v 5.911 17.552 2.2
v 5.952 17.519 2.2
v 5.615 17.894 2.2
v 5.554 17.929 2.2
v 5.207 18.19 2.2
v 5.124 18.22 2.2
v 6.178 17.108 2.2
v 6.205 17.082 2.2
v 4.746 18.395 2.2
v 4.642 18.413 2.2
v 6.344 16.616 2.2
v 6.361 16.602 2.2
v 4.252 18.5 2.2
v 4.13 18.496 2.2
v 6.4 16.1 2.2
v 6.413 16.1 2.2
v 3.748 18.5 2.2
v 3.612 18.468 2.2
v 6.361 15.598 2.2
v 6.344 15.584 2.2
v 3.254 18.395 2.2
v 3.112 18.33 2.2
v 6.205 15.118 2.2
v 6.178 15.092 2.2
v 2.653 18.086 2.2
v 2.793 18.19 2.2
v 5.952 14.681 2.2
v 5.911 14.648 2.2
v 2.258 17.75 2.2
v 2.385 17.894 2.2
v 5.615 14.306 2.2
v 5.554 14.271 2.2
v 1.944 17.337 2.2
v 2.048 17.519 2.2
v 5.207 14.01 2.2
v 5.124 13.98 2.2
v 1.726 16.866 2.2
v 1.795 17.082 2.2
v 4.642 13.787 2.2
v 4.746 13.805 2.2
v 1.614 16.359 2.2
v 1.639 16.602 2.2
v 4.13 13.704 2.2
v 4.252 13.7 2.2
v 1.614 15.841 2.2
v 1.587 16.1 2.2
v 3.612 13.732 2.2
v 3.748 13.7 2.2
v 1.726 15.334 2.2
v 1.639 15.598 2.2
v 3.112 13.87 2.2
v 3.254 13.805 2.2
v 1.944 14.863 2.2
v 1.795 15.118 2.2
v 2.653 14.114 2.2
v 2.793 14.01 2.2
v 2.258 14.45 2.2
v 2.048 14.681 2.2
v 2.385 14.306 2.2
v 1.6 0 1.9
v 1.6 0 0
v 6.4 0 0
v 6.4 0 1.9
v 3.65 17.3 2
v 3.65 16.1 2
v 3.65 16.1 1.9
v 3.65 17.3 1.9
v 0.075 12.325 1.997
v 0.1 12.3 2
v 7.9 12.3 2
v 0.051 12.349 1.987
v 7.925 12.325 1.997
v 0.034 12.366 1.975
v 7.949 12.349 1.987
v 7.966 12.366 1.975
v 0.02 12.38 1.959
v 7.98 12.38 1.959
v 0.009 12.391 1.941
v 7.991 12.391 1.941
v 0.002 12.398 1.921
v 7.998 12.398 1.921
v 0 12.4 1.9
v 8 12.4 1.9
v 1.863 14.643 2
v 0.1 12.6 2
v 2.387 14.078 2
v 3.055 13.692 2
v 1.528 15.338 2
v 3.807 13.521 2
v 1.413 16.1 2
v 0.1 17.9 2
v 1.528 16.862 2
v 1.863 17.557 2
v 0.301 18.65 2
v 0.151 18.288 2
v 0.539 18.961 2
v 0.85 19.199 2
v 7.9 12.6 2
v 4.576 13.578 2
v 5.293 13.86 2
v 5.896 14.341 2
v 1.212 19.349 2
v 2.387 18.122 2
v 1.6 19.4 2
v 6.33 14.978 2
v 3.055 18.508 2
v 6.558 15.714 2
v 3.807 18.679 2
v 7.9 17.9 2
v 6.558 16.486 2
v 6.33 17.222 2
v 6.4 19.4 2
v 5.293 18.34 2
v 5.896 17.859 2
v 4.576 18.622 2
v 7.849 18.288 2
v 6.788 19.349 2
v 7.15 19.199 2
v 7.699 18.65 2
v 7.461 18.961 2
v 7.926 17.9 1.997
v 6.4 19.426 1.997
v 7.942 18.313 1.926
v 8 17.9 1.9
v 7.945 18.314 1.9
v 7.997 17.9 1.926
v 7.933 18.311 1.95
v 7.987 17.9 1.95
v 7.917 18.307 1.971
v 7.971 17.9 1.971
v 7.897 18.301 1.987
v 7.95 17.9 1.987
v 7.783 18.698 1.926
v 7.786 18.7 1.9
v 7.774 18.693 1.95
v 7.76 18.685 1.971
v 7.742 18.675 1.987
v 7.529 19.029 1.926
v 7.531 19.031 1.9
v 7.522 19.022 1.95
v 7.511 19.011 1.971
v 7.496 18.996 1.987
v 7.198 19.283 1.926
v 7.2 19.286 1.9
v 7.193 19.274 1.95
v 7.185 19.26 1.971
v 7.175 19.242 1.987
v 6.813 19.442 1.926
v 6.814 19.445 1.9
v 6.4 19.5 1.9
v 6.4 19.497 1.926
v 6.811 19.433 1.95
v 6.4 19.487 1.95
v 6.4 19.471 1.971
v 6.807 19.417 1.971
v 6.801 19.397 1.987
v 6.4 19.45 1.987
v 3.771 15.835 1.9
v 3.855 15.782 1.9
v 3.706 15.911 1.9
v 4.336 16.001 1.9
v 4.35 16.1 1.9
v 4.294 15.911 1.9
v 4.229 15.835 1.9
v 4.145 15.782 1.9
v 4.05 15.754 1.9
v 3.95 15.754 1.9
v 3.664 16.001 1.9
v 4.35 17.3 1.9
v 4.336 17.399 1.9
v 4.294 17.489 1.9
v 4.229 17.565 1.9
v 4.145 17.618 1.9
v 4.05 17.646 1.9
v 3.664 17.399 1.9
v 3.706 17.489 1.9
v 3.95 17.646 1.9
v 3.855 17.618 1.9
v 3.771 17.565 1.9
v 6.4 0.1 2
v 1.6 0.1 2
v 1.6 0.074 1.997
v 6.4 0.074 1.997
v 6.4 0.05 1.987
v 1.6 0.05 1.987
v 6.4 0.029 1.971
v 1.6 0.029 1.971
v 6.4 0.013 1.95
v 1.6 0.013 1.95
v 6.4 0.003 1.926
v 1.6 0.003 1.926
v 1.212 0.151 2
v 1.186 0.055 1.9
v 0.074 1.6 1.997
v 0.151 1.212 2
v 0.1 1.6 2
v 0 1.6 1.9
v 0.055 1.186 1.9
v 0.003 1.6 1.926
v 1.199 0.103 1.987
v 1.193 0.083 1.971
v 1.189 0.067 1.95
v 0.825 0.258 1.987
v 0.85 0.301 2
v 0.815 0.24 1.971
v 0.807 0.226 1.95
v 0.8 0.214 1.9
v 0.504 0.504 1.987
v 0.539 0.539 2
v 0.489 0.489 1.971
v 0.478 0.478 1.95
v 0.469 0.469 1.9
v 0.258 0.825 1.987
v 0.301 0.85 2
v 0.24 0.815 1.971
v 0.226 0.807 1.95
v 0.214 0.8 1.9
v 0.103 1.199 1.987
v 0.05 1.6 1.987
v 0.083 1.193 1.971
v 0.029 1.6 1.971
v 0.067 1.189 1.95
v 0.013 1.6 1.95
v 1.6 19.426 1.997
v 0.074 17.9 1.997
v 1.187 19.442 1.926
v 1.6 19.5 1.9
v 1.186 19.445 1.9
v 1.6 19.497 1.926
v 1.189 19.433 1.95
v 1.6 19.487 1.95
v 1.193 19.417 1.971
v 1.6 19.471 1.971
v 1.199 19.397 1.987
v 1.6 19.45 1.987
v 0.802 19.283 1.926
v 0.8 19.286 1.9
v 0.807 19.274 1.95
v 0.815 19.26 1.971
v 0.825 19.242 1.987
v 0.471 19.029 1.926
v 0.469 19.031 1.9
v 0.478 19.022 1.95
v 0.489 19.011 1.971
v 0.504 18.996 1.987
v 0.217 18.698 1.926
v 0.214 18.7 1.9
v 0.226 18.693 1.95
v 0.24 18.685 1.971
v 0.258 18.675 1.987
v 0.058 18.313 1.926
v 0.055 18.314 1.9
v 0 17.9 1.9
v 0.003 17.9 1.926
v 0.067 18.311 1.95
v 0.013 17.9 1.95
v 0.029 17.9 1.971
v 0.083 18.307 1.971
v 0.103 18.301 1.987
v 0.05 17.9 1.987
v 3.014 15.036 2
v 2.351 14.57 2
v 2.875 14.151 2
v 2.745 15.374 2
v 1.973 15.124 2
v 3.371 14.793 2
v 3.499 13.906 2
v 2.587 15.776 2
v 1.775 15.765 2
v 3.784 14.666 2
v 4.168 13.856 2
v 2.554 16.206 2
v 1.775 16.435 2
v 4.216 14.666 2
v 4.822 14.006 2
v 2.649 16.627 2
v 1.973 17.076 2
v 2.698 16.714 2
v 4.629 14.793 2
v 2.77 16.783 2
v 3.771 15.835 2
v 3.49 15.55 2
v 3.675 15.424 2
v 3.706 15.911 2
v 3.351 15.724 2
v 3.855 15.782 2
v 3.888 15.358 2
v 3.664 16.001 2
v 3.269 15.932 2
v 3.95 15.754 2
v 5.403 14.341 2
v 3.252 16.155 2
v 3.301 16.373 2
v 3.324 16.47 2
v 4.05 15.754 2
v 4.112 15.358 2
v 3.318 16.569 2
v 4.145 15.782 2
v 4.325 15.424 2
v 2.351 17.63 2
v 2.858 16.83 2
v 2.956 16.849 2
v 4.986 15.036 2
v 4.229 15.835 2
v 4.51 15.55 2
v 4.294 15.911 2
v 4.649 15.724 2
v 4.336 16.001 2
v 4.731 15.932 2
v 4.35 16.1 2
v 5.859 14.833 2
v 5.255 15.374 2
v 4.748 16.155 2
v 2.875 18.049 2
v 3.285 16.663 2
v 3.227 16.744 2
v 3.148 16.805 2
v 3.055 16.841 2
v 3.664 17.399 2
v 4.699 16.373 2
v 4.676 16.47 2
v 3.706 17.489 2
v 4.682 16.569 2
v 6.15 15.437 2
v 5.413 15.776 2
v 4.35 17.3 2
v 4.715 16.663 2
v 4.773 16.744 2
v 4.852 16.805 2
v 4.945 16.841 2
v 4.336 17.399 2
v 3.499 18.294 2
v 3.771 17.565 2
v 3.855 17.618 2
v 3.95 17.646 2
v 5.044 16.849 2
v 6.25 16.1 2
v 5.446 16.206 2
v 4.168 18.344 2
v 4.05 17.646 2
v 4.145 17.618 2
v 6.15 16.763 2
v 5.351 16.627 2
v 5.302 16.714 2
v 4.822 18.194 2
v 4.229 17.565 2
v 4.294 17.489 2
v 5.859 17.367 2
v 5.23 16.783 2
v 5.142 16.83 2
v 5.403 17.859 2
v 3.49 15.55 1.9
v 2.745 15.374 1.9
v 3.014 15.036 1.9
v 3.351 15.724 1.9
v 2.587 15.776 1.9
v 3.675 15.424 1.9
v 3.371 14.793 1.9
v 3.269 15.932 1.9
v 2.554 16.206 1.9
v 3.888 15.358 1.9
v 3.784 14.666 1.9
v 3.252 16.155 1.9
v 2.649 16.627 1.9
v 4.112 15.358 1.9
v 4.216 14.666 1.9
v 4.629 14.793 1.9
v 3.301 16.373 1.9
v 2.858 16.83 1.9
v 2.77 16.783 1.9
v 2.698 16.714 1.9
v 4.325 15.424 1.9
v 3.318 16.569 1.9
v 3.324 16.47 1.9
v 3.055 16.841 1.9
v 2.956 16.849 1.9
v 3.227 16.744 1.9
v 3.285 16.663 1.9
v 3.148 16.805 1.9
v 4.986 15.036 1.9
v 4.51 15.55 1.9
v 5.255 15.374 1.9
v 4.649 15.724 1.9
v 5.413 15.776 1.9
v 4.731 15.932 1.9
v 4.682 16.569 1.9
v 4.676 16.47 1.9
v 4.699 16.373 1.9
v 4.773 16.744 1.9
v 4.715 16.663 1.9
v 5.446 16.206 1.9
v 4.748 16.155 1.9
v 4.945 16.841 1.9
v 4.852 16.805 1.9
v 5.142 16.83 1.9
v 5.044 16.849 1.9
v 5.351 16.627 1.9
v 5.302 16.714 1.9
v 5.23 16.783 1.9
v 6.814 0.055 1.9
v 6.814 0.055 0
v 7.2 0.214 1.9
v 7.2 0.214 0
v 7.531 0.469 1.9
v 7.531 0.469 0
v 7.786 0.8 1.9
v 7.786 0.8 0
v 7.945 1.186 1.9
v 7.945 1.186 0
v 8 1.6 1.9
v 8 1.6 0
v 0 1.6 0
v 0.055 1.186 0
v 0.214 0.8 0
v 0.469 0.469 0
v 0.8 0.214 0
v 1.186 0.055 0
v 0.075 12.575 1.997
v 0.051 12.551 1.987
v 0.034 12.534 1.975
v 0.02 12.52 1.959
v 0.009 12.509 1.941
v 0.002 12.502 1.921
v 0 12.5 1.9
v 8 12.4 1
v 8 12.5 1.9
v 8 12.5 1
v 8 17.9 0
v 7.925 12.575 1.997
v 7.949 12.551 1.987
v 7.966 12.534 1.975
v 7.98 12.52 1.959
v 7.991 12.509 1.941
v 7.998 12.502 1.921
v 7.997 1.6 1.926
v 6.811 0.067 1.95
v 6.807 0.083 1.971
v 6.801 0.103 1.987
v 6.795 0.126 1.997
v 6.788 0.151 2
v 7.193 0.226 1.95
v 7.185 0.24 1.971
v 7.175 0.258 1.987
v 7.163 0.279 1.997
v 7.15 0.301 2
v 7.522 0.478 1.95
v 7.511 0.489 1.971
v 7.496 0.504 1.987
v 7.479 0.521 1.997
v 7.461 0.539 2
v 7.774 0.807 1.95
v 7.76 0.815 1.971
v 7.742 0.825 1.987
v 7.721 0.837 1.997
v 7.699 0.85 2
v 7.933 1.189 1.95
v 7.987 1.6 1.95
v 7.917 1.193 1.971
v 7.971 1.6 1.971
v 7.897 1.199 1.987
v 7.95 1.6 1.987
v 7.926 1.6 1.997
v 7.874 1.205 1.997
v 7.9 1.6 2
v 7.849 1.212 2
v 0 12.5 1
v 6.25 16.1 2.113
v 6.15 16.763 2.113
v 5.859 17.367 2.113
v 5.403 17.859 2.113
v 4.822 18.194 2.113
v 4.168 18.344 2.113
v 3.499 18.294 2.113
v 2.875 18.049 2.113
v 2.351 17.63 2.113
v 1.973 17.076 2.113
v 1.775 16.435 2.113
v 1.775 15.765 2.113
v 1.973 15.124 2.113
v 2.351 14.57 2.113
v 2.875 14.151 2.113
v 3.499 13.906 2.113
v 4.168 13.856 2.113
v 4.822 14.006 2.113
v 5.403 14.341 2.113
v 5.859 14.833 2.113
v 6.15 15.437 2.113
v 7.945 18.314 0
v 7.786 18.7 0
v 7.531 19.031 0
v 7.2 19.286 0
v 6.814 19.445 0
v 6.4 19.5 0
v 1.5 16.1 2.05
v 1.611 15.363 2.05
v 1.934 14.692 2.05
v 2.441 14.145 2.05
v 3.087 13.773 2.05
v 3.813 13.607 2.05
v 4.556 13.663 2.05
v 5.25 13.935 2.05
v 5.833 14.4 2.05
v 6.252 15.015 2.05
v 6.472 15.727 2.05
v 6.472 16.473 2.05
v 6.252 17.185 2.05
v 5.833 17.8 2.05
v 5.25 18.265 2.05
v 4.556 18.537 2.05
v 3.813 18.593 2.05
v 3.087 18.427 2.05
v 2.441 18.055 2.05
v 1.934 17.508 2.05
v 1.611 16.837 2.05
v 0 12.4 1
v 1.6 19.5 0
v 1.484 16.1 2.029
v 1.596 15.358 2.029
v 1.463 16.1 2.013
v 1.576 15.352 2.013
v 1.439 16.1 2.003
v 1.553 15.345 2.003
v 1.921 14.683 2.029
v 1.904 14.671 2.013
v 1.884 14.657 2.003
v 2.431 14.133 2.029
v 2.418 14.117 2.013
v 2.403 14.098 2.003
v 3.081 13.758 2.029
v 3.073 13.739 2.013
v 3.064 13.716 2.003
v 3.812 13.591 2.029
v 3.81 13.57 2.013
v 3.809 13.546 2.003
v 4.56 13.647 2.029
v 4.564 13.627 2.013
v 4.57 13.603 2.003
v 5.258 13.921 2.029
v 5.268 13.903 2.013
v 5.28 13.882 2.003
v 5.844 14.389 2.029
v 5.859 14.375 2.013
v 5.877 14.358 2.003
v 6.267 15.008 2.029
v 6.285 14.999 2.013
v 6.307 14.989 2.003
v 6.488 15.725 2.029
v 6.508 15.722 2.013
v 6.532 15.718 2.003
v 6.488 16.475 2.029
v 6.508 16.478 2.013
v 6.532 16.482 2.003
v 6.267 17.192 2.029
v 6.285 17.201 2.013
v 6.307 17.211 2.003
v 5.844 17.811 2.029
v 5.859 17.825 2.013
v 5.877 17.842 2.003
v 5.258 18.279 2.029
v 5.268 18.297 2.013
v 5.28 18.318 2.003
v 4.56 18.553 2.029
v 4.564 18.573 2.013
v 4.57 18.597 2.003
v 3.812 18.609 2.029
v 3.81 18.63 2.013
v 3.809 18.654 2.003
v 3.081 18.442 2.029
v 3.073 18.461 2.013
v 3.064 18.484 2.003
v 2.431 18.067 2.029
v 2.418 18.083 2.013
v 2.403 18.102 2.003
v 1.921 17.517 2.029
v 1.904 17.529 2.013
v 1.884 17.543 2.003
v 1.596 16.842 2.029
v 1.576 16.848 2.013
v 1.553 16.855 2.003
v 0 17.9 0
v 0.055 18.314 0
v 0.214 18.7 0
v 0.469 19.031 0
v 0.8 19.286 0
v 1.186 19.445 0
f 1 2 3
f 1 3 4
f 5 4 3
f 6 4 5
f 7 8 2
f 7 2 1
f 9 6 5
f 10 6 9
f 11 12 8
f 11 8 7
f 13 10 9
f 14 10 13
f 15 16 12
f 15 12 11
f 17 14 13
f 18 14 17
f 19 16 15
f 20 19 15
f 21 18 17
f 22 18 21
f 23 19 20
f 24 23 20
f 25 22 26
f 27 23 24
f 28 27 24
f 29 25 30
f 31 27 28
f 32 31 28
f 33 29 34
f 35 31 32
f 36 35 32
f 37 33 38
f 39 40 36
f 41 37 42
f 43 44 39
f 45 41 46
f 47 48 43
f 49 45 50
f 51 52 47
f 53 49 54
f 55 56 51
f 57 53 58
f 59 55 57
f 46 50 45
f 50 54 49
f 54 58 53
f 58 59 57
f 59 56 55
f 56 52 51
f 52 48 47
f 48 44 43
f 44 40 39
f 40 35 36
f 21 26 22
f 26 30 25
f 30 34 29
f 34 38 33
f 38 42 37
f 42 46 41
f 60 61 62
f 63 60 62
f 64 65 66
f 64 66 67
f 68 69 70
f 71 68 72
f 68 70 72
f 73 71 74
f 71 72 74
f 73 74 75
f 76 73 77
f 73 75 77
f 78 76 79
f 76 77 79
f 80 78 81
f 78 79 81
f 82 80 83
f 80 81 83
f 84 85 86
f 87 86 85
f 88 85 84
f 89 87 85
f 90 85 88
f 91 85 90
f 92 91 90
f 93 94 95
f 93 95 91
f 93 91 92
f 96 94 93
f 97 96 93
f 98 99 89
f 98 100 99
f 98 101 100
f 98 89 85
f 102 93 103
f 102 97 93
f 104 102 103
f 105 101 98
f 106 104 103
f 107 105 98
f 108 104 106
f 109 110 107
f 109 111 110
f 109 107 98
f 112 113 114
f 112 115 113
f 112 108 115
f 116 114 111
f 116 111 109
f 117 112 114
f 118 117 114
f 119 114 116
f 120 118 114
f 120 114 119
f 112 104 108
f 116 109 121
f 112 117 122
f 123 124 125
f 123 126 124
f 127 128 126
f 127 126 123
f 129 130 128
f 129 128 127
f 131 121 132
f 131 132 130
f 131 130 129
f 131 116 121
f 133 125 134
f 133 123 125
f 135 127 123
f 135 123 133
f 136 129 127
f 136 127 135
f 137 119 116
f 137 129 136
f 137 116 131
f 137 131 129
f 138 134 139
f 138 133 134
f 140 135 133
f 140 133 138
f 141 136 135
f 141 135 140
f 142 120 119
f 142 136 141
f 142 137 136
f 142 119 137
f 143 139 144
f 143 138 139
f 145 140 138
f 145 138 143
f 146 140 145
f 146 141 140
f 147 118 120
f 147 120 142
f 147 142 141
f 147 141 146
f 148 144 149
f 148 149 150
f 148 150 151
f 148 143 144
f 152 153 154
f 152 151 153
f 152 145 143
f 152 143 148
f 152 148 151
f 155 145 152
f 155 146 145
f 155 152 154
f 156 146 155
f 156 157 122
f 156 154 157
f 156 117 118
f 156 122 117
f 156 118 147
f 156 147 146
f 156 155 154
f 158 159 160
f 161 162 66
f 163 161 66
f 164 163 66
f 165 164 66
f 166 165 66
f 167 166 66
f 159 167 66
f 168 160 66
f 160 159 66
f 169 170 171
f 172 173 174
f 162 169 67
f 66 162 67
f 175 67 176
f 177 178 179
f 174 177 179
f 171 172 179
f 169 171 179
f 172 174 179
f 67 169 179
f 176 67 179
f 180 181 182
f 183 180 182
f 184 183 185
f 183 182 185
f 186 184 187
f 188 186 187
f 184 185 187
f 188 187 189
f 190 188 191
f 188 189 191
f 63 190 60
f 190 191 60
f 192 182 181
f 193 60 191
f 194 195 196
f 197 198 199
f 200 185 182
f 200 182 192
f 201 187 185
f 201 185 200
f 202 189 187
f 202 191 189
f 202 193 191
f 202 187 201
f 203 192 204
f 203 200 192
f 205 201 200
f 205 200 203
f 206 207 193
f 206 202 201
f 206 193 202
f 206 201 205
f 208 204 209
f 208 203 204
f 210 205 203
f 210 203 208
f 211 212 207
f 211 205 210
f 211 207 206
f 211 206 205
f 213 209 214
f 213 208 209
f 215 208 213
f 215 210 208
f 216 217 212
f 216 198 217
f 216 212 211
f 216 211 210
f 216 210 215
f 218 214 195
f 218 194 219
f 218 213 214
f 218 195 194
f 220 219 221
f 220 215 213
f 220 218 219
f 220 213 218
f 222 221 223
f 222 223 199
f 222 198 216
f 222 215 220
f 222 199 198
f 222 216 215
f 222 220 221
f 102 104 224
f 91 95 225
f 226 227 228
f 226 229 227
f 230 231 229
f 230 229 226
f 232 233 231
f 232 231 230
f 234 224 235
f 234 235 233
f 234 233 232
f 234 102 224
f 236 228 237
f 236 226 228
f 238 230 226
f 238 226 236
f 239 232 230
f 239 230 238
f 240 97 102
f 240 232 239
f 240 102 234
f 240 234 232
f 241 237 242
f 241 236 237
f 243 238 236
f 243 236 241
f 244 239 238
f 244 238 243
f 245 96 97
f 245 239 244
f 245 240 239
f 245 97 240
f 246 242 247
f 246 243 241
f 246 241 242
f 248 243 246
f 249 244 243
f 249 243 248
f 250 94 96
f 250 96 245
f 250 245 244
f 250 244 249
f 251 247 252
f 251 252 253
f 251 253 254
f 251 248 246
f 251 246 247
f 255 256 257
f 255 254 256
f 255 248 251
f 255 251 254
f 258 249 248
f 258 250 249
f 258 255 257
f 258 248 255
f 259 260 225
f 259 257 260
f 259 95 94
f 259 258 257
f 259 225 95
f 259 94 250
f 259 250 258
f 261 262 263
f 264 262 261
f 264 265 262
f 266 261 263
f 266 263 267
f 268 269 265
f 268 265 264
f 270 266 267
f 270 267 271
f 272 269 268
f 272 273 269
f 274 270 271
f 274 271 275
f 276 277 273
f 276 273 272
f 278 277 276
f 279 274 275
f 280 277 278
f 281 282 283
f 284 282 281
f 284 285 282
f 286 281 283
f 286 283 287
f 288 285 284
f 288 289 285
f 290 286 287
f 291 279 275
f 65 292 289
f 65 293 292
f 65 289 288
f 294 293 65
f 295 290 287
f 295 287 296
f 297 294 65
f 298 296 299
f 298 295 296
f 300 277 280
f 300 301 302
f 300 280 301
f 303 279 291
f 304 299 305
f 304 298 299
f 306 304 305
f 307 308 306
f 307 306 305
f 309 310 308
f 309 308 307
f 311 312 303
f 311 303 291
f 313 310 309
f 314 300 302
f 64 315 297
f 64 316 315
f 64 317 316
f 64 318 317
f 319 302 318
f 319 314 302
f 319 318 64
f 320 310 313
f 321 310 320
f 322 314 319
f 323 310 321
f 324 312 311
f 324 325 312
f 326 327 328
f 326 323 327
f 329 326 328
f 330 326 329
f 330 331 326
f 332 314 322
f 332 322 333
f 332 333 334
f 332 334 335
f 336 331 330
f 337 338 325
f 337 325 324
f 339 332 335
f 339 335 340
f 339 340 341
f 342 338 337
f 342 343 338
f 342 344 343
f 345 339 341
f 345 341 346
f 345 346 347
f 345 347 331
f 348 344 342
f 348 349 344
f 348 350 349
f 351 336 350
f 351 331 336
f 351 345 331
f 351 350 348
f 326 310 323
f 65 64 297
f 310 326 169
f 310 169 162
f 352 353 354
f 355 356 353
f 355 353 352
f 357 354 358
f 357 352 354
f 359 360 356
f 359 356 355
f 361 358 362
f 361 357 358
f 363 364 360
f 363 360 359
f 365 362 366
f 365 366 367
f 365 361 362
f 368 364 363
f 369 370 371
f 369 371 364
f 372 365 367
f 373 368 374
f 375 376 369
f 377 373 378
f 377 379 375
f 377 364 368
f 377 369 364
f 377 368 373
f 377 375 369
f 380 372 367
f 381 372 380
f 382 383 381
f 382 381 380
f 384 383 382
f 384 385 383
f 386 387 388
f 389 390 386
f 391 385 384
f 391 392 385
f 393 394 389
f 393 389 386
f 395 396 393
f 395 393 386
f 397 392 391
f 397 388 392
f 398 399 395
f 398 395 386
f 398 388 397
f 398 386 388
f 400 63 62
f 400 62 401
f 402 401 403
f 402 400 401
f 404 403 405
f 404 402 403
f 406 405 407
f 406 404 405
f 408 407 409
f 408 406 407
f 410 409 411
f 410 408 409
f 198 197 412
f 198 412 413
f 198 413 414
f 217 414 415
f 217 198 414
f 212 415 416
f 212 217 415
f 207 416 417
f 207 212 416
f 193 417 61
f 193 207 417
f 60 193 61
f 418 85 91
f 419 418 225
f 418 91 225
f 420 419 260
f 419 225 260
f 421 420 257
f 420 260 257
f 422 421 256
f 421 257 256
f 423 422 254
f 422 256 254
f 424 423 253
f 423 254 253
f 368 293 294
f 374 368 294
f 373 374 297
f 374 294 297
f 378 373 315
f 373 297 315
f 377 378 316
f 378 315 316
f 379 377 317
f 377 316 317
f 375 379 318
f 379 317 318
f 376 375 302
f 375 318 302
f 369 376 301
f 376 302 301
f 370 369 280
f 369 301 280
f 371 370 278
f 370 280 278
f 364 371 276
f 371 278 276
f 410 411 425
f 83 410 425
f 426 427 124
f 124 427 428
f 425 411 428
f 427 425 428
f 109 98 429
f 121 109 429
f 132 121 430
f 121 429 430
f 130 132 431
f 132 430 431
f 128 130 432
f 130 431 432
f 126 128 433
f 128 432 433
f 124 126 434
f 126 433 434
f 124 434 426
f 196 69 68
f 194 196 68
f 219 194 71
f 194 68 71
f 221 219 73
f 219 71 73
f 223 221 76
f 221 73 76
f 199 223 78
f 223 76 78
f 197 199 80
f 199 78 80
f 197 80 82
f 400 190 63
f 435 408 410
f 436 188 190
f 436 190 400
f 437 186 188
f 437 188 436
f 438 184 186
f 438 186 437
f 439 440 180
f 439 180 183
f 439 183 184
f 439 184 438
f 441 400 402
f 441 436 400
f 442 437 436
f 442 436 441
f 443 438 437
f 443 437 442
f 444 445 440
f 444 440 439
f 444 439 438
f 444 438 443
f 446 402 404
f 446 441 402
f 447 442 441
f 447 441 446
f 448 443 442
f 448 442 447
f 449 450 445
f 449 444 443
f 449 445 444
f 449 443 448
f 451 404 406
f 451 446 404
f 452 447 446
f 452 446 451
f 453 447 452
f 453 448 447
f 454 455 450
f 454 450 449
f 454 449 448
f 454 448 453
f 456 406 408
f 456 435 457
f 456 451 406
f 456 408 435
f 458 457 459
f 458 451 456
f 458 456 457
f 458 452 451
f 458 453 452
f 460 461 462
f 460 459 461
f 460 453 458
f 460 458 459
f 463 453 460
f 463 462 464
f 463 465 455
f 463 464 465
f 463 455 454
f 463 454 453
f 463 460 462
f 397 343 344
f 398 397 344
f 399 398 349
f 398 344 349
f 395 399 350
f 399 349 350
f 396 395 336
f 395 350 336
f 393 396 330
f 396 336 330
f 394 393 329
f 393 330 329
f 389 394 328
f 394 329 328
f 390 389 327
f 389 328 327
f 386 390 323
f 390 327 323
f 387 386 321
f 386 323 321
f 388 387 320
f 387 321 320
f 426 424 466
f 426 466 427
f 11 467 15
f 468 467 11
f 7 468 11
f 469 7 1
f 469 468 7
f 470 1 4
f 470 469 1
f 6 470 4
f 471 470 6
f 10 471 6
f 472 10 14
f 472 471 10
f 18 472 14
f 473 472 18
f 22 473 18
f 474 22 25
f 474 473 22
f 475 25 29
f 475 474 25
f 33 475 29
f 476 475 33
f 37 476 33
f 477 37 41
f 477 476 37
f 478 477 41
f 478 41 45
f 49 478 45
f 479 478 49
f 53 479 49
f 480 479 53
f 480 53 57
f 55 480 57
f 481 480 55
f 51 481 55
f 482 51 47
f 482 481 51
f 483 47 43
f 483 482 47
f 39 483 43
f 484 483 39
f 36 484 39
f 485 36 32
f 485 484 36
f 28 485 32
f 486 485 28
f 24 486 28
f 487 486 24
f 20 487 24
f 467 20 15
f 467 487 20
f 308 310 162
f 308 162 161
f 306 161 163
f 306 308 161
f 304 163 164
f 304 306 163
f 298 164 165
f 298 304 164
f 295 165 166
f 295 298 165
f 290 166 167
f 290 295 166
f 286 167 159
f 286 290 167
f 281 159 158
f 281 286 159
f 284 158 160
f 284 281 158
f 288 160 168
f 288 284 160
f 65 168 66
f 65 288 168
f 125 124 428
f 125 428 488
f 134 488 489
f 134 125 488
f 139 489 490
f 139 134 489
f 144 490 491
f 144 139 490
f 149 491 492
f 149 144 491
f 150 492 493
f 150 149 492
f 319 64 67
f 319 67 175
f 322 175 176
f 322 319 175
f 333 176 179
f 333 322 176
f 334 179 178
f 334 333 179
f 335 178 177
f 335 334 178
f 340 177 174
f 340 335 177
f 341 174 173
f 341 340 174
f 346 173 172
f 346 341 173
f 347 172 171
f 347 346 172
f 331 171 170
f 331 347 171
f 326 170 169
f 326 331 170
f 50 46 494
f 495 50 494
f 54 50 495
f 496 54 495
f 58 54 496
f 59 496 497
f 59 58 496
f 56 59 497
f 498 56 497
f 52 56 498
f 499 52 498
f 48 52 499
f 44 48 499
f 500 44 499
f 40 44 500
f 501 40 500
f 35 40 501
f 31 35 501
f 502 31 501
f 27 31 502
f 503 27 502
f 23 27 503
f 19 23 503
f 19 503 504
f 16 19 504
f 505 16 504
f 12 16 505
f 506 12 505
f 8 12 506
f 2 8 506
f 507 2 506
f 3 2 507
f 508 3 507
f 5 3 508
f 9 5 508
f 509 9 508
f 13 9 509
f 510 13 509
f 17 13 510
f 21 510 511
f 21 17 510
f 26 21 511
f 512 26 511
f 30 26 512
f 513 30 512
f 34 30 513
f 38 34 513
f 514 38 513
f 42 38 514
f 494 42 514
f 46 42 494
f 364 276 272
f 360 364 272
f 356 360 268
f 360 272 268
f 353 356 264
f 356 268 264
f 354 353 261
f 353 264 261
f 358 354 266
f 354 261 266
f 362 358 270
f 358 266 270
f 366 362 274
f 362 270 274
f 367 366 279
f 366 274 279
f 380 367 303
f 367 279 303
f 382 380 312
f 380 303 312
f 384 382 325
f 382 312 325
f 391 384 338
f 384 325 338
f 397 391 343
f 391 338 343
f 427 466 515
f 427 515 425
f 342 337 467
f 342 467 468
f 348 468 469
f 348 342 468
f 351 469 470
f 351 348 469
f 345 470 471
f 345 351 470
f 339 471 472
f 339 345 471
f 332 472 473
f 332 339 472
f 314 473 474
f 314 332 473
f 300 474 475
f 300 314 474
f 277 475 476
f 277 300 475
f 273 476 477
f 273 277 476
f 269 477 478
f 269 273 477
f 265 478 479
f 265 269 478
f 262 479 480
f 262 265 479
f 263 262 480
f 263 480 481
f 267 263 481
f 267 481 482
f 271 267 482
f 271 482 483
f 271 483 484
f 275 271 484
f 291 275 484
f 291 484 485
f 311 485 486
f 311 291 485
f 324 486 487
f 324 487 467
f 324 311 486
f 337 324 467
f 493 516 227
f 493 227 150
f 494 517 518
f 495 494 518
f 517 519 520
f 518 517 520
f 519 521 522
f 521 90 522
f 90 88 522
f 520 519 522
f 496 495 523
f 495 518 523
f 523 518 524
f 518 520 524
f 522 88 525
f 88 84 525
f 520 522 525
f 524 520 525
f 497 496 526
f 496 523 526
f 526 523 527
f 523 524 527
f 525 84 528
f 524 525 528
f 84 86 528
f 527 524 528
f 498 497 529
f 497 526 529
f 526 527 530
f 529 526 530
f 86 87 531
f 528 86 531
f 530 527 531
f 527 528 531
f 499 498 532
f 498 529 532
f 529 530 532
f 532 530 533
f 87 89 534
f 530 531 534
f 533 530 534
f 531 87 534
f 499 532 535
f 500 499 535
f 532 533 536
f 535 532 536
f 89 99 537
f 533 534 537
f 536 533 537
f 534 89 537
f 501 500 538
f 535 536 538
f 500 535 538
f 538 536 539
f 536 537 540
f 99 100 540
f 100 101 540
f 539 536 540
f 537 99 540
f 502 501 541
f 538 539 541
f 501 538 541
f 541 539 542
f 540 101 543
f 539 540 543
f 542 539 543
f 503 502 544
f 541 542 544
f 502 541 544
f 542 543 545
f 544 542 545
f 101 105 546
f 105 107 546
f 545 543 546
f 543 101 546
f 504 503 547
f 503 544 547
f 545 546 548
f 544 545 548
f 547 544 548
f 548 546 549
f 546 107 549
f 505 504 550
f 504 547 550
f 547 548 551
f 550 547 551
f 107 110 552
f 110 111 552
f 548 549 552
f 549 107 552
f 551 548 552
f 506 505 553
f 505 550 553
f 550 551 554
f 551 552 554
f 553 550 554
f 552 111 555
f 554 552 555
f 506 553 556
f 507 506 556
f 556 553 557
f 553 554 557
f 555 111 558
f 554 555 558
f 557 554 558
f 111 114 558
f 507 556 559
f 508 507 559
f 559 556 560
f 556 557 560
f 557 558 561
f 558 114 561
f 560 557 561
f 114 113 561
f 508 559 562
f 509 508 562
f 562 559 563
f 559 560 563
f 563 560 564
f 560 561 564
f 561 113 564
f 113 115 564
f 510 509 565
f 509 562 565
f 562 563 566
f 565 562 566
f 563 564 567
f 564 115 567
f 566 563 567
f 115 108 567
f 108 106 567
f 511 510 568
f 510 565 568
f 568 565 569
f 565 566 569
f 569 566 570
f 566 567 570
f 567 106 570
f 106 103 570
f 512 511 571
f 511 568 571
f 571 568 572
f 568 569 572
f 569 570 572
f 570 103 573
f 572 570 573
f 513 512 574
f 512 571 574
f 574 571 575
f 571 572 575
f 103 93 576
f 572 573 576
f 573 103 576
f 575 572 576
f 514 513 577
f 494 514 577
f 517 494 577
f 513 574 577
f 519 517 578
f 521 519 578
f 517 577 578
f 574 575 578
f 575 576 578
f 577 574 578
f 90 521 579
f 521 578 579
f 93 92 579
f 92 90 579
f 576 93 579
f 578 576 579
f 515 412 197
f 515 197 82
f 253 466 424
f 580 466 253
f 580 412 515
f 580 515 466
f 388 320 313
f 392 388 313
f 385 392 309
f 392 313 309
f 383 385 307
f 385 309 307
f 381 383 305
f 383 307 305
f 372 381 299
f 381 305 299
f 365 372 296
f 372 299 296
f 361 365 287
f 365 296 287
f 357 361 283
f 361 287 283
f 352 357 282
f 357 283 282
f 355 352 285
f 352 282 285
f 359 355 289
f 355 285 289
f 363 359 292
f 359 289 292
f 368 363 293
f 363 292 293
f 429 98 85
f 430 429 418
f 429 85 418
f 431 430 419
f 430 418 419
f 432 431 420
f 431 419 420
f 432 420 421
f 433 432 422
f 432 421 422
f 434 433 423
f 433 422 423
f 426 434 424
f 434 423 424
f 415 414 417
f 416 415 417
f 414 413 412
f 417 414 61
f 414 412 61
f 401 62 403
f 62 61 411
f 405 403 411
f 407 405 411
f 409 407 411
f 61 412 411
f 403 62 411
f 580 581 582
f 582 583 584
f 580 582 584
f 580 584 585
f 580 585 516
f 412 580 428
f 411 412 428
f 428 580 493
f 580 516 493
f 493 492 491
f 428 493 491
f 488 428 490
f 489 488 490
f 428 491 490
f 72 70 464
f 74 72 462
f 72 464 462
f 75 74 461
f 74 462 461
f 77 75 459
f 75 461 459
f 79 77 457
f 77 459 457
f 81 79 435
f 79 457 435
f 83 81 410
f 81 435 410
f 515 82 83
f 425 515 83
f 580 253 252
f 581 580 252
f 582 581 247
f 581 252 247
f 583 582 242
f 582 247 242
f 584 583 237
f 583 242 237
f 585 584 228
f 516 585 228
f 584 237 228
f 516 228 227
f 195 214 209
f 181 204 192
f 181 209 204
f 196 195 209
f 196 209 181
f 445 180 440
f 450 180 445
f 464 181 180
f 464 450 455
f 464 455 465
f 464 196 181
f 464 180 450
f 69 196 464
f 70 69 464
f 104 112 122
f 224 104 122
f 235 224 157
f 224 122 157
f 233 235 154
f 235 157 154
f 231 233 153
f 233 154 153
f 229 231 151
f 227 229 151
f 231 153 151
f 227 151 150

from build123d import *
from OCP.BRepFilletAPI import BRepFilletAPI_MakeChamfer

# Parameters (mm, degrees)
SKETCH1_W           = 8
SKETCH1_H           = 19.5
BOSS_EXTRUDE1_DEPTH = 2
FILLET1_R           = 1.6
CUT_EXTRUDE1_DEPTH  = 0.1
SKETCH4_R           = 2.5
SKETCH4_R_2         = 2.25
BOSS_EXTRUDE2_DEPTH = 0.2
CHAMFER1_SIZE       = 0.15
CHAMFER1_SIZE2      = 0.08660254
SKETCH5_W           = 8
SKETCH5_H           = 0.1
CUT_EXTRUDE2_DEPTH  = 1
FILLET2_R           = 0.1


with BuildPart() as part:
    # Sketch1 → Boss-Extrude1 (new body)
    with BuildSketch(Plane.XY):
        with Locations((4, 9.75)):
            Rectangle(SKETCH1_W, SKETCH1_H)
    extrude(amount=BOSS_EXTRUDE1_DEPTH)

    # Fillet1
    fillet1_edges = [part.edges().sort_by_distance(p)[0] for p in [
        (0, 19.5, 1),
        (8, 19.5, 1),
        (8, 0, 1),
        (0, 0, 1),
    ]]
    fillet(fillet1_edges, radius=FILLET1_R)

    # Sketch3 → Cut-Extrude1 (cut)
    with BuildSketch(Plane.XY.offset(2)):
        with BuildLine():
            Line((4.35, 17.3), (4.35, 16.1))
            ThreePointArc((4.35, 16.1), (4, 15.75), (3.65, 16.1))
            Line((3.65, 16.1), (3.65, 17.3))
            ThreePointArc((3.65, 17.3), (4, 17.65), (4.35, 17.3))
        make_face()
        with BuildLine():
            ThreePointArc((2.649265581, 16.627272727), (4, 14.65), (5.350734419, 16.627272727))
            ThreePointArc((5.350734419, 16.627272727), (4.897422349, 16.826039343), (4.698655734, 16.372727273))
            ThreePointArc((4.698655734, 16.372727273), (4, 15.35), (3.301344266, 16.372727273))
            ThreePointArc((3.301344266, 16.372727273), (3.102577651, 16.826039343), (2.649265581, 16.627272727))
        make_face()
    extrude(amount=-CUT_EXTRUDE1_DEPTH, mode=Mode.SUBTRACT)

    # Sketch4 → Boss-Extrude2 (add)
    with BuildSketch(Plane.XY.offset(2)):
        with Locations(Location((4, 16.1, 0), (0, 0, 180))):
            Circle(SKETCH4_R)
        with Locations((4, 16.1)):
            Circle(SKETCH4_R_2, mode=Mode.SUBTRACT)
    extrude(amount=BOSS_EXTRUDE2_DEPTH)

    # Chamfer1: one chamfer whose edges measure the first distance from different faces: ONE call of the kernel's chamfer builder (chamfer() names one face for all edges)
    chamfer1_edges_1 = [part.edges().sort_by_distance(p)[0] for p in [
        (6.5, 16.1, 2.2),
    ]]
    chamfer1_side_1 = [part.faces().sort_by_distance(p)[0] for p in [
        (6.5, 16.1, 2.1),
    ]]
    chamfer1_edges_2 = [part.edges().sort_by_distance(p)[0] for p in [
        (1.75, 16.1, 2.2),
    ]]
    chamfer1_side_2 = [part.faces().sort_by_distance(p)[0] for p in [
        (6.429289322, 16.1, 2.2),
    ]]
    chamfer1 = BRepFilletAPI_MakeChamfer(part.part.solid().wrapped)
    for e in chamfer1_edges_1:
        chamfer1.Add(CHAMFER1_SIZE, CHAMFER1_SIZE2, e.wrapped, chamfer1_side_1[0].wrapped)  # the first distance lies on this face
    for e in chamfer1_edges_2:
        chamfer1.Add(CHAMFER1_SIZE, CHAMFER1_SIZE2, e.wrapped, chamfer1_side_2[0].wrapped)  # the first distance lies on this face
    add(Compound.cast(chamfer1.Shape()), mode=Mode.REPLACE)

    # Sketch5 → Cut-Extrude2 (cut)
    with BuildSketch(Plane.XY.offset(2)):
        with Locations((4, 12.45)):
            Rectangle(SKETCH5_W, SKETCH5_H)
    extrude(amount=-CUT_EXTRUDE2_DEPTH, mode=Mode.SUBTRACT)

    # Fillet2
    # the kernel refuses this fillet: 0.1 mm, written as the material it adds along each edge
    with BuildSketch(Plane(origin=(4, 16.1, 2), x_dir=(-1, 0, 0), z_dir=(0, 1, 0))) as fillet2_piece_1:
        with BuildLine():
            CenterArc((2.58660254, 0.1), FILLET2_R, 210, 60)
            Line((2.58660254, 0), (2.5, 0))
            Line((2.5, 0), (2.5, 0.05))
        make_face()
    revolve(axis=Axis((4, 16.1, 2), (0, 0, 1)))
    # the kernel refuses this fillet: 0.1 mm, written as the material it takes off along each edge
    with BuildSketch(Plane(origin=(8, 1.6, 2), x_dir=(0, 0, -1), z_dir=(0, 1, 0)), Plane(origin=(0, 12.65, 2), x_dir=(0, 0, -1), z_dir=(0, -1, 0))) as fillet2_2_piece_1:
        with BuildLine():
            CenterArc((FILLET2_R, FILLET2_R), FILLET2_R, 180, 90)
            Line((0, FILLET2_R), (0, 0))
            Line((0, 0), (FILLET2_R, 0))
        make_face()
    extrude(amount=11.05, mode=Mode.SUBTRACT)
    with BuildSketch(Plane(origin=(1.6, 0, 2), x_dir=(0, 1, 0), z_dir=(1, 0, 0)), Plane(origin=(6.4, 19.5, 2), x_dir=(0, -1, 0), z_dir=(-1, 0, 0))) as fillet2_2_piece_2:
        with BuildLine():
            CenterArc((FILLET2_R, -FILLET2_R), FILLET2_R, 90, 90)
            Line((0, -FILLET2_R), (0, 0))
            Line((0, 0), (FILLET2_R, 0))
        make_face()
    extrude(amount=4.8, mode=Mode.SUBTRACT)
    with BuildSketch(Plane(origin=(0, 17.9, 2), x_dir=(1, 0, 0), z_dir=(0, -1, 0)), Plane(origin=(8, 12.25, 2), x_dir=(-1, 0, 0), z_dir=(0, 1, 0))) as fillet2_2_piece_3:
        with BuildLine():
            CenterArc((FILLET2_R, -FILLET2_R), FILLET2_R, 90, 90)
            Line((0, -FILLET2_R), (0, 0))
            Line((0, 0), (FILLET2_R, 0))
        make_face()
    extrude(amount=5.65, mode=Mode.SUBTRACT)
    with BuildSketch(Plane(origin=(1.6, 17.9, 2), x_dir=(0, 1, 0), z_dir=(1, 0, 0))) as fillet2_2_piece_4:
        with BuildLine():
            CenterArc((1.6 - FILLET2_R, -FILLET2_R), FILLET2_R, 0, 90)
            Line((1.6, -FILLET2_R), (1.6, 0))
            Line((1.6, 0), (1.6 - FILLET2_R, 0))
        make_face()
    revolve(axis=Axis((1.6, 17.9, 2), (0, 0, 1)), revolution_arc=90, mode=Mode.SUBTRACT)
    with BuildSketch(Plane(origin=(6.4, 17.9, 2), x_dir=(1, 0, 0), z_dir=(0, -1, 0))) as fillet2_2_piece_5:
        with BuildLine():
            CenterArc((1.6 - FILLET2_R, -FILLET2_R), FILLET2_R, 0, 90)
            Line((1.6, -FILLET2_R), (1.6, 0))
            Line((1.6, 0), (1.6 - FILLET2_R, 0))
        make_face()
    revolve(axis=Axis((6.4, 17.9, 2), (0, 0, 1)), revolution_arc=90, mode=Mode.SUBTRACT)
    with BuildSketch(Plane(origin=(1.6, 1.6, 2), x_dir=(0, -1, 0), z_dir=(1, 0, 0))) as fillet2_2_piece_6:
        with BuildLine():
            CenterArc((1.6 - FILLET2_R, FILLET2_R), FILLET2_R, 270, 90)
            Line((1.6 - FILLET2_R, 0), (1.6, 0))
            Line((1.6, 0), (1.6, FILLET2_R))
        make_face()
    revolve(axis=Axis((1.6, 1.6, 2), (0, 0, -1)), revolution_arc=90, mode=Mode.SUBTRACT)
    with BuildSketch(Plane(origin=(6.4, 1.6, 2), x_dir=(0, -1, 0), z_dir=(-1, 0, 0))) as fillet2_2_piece_7:
        with BuildLine():
            CenterArc((1.6 - FILLET2_R, -FILLET2_R), FILLET2_R, 0, 90)
            Line((1.6, -FILLET2_R), (1.6, 0))
            Line((1.6, 0), (1.6 - FILLET2_R, 0))
        make_face()
    revolve(axis=Axis((6.4, 1.6, 2), (0, 0, 1)), revolution_arc=90, mode=Mode.SUBTRACT)
    with BuildSketch(Plane(origin=(8.25, 12.4, 2), x_dir=(0, -1, 0), z_dir=(-1, 0, 0)), Plane(origin=(-0.25, 12.5, 2), x_dir=(0, 1, 0), z_dir=(1, 0, 0))) as fillet2_2_piece_8:
        with BuildLine():
            CenterArc((FILLET2_R, -FILLET2_R), FILLET2_R, 90, 90)
            Line((0, -FILLET2_R), (0, 0))
            Line((0, 0), (FILLET2_R, 0))
        make_face()
    extrude(amount=8.5, mode=Mode.SUBTRACT)


solid = part.part
